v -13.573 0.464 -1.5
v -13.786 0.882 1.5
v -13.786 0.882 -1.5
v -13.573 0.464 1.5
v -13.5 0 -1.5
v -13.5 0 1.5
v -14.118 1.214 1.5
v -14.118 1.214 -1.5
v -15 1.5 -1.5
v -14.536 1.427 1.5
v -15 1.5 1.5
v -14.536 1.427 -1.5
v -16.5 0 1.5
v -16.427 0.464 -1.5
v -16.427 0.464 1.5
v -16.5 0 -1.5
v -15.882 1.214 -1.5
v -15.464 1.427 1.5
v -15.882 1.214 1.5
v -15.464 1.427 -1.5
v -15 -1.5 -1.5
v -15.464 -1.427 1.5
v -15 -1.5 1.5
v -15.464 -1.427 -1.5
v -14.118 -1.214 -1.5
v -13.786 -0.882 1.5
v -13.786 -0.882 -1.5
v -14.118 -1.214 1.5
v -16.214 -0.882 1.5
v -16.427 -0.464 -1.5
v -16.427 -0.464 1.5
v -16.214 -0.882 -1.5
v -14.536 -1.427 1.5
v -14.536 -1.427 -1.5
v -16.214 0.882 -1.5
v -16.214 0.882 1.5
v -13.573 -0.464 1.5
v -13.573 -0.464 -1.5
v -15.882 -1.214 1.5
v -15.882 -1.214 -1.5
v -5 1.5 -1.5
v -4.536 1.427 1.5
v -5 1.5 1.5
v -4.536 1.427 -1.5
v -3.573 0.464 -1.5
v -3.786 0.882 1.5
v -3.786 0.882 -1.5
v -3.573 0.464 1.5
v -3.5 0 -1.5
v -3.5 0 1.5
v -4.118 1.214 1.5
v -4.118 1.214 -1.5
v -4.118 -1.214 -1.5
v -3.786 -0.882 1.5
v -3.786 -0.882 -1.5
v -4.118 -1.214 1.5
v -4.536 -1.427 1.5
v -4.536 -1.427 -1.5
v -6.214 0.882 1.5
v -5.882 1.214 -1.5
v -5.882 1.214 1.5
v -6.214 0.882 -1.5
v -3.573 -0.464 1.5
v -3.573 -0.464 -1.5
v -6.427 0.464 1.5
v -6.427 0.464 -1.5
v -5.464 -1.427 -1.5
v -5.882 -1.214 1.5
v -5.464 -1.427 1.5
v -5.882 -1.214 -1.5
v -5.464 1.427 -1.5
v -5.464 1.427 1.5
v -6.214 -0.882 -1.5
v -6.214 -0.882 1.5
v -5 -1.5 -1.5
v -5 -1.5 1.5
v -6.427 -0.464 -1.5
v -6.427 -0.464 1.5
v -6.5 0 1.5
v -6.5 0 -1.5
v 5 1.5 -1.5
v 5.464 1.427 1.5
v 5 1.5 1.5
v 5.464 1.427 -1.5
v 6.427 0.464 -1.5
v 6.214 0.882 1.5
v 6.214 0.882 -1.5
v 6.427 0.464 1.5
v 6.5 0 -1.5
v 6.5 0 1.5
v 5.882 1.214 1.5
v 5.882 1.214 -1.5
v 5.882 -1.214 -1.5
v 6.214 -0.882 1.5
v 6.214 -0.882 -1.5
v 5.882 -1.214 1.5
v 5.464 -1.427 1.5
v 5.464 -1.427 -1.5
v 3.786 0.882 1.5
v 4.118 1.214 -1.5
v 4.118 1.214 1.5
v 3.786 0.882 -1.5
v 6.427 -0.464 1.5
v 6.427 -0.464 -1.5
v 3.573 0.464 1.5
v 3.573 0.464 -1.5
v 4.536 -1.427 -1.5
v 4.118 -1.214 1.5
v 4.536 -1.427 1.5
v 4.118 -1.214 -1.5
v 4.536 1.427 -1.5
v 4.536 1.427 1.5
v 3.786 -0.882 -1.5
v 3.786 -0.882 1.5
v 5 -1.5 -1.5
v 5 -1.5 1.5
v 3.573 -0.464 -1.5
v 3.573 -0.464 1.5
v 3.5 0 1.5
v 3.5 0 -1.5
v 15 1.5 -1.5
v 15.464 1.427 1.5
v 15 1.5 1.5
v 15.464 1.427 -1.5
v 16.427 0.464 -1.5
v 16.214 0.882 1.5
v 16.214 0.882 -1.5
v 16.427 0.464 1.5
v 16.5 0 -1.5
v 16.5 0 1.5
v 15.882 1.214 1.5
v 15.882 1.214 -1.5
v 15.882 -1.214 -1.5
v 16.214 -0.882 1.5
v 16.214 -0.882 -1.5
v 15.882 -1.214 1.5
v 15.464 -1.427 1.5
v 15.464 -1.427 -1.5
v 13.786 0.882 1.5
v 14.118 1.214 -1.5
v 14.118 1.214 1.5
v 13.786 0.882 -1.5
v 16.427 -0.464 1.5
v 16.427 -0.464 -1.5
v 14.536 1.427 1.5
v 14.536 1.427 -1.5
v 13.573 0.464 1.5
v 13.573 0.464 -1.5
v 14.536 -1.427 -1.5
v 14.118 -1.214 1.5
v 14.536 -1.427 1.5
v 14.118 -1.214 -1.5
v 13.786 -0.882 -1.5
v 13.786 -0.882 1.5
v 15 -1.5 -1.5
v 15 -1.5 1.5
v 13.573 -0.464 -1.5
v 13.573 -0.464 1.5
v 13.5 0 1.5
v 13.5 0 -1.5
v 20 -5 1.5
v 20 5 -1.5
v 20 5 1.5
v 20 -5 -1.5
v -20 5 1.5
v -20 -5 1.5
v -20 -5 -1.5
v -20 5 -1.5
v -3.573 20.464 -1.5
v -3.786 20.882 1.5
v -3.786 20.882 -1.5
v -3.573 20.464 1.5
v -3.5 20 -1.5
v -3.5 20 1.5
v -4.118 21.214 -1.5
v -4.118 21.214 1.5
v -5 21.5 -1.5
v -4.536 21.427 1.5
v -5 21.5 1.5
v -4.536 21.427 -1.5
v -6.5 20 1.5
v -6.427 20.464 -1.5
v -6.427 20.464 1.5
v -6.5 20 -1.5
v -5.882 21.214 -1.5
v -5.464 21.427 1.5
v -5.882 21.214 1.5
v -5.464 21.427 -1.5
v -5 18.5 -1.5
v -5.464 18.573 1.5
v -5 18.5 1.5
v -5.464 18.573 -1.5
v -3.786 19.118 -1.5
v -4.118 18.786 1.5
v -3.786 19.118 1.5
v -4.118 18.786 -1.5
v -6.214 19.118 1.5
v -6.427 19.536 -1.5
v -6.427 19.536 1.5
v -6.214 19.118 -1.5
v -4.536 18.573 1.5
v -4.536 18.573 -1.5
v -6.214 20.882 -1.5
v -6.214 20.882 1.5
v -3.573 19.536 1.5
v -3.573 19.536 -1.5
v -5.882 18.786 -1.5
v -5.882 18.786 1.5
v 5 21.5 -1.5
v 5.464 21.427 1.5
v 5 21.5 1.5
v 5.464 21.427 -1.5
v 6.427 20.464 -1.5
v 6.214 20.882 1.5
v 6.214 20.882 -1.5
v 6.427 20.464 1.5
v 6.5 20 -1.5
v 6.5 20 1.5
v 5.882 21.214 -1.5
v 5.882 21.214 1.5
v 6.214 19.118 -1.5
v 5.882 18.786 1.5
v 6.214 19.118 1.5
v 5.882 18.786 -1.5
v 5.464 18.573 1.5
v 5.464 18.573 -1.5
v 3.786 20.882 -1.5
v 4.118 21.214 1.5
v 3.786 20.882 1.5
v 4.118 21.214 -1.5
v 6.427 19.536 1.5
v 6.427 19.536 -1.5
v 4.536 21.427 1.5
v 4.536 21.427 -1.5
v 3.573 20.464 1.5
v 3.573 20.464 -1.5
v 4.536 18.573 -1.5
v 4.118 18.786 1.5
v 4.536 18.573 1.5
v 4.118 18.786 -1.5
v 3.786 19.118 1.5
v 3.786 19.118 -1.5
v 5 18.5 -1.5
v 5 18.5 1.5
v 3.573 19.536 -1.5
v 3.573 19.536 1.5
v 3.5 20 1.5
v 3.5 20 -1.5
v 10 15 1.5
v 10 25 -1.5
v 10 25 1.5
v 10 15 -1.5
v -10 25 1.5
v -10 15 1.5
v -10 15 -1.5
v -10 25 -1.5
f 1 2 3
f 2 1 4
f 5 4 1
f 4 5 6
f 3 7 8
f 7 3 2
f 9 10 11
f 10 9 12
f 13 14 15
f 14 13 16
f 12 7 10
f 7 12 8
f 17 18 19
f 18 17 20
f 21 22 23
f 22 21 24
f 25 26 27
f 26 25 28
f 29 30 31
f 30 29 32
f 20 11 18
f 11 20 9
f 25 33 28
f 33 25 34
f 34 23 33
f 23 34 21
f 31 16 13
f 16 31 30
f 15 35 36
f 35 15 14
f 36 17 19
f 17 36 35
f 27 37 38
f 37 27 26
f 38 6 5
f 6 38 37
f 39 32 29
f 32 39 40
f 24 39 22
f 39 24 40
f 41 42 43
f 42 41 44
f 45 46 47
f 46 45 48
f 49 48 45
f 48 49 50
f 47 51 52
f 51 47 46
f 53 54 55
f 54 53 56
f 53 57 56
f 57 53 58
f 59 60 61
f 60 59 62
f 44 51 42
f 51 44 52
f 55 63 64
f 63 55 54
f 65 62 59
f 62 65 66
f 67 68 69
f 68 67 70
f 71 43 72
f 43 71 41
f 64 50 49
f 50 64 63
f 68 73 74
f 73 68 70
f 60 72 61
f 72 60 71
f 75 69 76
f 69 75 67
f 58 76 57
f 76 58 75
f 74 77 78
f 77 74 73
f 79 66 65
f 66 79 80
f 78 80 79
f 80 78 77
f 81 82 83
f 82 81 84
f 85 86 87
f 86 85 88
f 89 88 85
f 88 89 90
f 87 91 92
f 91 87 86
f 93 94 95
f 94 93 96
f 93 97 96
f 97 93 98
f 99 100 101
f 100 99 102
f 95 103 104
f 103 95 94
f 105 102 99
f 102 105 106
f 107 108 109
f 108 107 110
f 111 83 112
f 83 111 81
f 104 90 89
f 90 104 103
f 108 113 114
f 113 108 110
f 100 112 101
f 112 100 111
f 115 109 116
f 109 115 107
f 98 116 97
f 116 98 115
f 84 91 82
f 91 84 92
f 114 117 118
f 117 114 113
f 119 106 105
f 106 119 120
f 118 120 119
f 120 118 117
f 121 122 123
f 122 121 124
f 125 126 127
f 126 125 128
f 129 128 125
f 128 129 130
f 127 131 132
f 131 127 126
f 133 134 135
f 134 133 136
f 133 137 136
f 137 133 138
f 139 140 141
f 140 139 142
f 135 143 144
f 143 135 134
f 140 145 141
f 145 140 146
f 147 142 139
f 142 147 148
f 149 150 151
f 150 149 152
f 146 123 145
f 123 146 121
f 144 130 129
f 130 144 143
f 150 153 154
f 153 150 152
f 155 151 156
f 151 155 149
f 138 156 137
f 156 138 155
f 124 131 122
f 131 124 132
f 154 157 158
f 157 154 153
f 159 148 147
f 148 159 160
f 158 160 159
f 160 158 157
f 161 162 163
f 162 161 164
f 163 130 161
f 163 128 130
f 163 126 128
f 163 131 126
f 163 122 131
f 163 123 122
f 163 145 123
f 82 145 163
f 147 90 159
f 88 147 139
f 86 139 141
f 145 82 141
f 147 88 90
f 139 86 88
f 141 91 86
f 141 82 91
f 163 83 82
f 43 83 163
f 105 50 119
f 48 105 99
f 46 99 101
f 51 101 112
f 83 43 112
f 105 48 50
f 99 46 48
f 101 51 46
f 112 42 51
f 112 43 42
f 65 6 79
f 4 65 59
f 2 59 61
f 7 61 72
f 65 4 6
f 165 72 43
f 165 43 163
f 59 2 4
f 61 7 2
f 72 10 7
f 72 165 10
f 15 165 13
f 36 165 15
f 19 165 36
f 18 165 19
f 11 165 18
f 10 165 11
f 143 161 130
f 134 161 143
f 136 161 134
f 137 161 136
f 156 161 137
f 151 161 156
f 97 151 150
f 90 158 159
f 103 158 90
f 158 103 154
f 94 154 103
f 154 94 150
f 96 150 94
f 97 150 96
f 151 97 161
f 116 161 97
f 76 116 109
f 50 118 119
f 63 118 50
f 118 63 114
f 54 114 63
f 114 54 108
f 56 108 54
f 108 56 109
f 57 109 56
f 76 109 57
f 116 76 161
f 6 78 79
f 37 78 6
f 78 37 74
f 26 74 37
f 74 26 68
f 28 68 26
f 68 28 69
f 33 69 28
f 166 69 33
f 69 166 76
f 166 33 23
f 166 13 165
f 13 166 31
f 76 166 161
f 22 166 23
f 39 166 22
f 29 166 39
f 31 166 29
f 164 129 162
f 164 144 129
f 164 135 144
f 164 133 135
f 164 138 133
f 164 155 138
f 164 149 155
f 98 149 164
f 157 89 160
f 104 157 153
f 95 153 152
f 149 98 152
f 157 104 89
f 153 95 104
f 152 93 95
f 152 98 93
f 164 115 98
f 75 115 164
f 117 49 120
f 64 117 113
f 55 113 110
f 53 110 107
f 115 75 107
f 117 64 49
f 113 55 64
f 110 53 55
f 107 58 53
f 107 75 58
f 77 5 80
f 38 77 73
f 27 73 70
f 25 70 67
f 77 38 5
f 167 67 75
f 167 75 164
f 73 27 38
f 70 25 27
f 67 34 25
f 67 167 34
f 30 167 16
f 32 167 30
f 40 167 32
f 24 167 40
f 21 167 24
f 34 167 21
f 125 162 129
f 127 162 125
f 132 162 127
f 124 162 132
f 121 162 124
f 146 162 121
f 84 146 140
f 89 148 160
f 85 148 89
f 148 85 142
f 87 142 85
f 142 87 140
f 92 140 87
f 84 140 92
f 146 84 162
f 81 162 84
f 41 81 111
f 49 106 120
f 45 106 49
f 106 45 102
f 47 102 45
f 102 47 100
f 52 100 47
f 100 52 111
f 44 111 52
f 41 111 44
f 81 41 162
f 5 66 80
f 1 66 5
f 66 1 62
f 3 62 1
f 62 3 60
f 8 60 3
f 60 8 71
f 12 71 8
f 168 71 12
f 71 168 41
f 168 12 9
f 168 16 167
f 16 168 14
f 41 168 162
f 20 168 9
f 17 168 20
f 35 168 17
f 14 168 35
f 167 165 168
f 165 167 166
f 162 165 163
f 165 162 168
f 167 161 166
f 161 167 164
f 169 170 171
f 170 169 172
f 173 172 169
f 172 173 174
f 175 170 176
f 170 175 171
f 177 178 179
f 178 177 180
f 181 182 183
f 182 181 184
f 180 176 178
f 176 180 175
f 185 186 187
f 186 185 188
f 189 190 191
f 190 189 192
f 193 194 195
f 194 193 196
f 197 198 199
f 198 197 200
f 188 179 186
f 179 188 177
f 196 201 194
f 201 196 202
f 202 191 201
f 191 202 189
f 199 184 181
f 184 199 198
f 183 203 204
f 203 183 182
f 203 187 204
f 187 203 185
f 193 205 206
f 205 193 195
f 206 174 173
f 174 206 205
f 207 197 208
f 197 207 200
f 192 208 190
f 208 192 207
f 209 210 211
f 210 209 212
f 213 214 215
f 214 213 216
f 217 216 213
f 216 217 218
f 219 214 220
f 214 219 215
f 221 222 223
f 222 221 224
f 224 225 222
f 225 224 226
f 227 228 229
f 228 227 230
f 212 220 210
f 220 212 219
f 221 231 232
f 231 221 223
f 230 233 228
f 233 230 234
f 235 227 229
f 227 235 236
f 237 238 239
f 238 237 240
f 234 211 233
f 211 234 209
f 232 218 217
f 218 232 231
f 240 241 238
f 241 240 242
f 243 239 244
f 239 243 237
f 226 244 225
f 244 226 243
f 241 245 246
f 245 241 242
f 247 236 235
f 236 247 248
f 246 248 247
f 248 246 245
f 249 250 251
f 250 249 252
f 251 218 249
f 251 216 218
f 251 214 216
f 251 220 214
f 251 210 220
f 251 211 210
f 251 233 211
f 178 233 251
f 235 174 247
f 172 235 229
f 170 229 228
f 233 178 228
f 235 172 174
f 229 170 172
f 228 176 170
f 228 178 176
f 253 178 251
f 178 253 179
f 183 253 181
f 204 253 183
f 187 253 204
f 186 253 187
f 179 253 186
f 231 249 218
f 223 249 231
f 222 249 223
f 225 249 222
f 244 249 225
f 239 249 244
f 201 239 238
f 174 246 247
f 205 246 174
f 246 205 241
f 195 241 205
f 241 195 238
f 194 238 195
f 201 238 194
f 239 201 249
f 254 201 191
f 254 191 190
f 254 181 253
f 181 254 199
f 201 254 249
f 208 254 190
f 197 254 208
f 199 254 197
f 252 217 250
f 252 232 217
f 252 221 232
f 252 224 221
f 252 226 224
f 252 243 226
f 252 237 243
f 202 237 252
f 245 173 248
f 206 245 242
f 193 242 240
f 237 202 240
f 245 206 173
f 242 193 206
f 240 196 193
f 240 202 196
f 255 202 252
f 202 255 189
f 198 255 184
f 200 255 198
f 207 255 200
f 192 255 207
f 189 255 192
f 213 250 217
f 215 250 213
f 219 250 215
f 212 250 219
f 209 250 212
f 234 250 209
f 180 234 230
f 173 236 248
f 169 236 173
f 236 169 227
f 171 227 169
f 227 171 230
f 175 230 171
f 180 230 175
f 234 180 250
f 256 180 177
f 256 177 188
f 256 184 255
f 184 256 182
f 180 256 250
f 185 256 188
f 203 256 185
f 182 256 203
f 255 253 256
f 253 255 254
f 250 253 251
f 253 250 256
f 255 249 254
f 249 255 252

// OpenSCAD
module pieza_mecano(drill=3, d=10, n=4, anchura=10,grosor=3){
  
    //-- Calcular la longitud de la pieza
    lx= n*d;

    //--Construimos la pieza
    difference(){
        //-- Cuerpo de la pieza
        cube([lx,anchura,grosor],center=true);
    
        //-- Taladros
        translate([-lx/2+d/2,0,0])
        for(i=[0:n-1]){ 
            translate([i*d,0,0])
                cylinder(r=drill/2, h=grosor+5, $fn=20, center=true);
    }
    }
}

//-- Ejemplos de utilización
pieza_mecano();

translate([0,20,0])
    pieza_mecano(n=2);
